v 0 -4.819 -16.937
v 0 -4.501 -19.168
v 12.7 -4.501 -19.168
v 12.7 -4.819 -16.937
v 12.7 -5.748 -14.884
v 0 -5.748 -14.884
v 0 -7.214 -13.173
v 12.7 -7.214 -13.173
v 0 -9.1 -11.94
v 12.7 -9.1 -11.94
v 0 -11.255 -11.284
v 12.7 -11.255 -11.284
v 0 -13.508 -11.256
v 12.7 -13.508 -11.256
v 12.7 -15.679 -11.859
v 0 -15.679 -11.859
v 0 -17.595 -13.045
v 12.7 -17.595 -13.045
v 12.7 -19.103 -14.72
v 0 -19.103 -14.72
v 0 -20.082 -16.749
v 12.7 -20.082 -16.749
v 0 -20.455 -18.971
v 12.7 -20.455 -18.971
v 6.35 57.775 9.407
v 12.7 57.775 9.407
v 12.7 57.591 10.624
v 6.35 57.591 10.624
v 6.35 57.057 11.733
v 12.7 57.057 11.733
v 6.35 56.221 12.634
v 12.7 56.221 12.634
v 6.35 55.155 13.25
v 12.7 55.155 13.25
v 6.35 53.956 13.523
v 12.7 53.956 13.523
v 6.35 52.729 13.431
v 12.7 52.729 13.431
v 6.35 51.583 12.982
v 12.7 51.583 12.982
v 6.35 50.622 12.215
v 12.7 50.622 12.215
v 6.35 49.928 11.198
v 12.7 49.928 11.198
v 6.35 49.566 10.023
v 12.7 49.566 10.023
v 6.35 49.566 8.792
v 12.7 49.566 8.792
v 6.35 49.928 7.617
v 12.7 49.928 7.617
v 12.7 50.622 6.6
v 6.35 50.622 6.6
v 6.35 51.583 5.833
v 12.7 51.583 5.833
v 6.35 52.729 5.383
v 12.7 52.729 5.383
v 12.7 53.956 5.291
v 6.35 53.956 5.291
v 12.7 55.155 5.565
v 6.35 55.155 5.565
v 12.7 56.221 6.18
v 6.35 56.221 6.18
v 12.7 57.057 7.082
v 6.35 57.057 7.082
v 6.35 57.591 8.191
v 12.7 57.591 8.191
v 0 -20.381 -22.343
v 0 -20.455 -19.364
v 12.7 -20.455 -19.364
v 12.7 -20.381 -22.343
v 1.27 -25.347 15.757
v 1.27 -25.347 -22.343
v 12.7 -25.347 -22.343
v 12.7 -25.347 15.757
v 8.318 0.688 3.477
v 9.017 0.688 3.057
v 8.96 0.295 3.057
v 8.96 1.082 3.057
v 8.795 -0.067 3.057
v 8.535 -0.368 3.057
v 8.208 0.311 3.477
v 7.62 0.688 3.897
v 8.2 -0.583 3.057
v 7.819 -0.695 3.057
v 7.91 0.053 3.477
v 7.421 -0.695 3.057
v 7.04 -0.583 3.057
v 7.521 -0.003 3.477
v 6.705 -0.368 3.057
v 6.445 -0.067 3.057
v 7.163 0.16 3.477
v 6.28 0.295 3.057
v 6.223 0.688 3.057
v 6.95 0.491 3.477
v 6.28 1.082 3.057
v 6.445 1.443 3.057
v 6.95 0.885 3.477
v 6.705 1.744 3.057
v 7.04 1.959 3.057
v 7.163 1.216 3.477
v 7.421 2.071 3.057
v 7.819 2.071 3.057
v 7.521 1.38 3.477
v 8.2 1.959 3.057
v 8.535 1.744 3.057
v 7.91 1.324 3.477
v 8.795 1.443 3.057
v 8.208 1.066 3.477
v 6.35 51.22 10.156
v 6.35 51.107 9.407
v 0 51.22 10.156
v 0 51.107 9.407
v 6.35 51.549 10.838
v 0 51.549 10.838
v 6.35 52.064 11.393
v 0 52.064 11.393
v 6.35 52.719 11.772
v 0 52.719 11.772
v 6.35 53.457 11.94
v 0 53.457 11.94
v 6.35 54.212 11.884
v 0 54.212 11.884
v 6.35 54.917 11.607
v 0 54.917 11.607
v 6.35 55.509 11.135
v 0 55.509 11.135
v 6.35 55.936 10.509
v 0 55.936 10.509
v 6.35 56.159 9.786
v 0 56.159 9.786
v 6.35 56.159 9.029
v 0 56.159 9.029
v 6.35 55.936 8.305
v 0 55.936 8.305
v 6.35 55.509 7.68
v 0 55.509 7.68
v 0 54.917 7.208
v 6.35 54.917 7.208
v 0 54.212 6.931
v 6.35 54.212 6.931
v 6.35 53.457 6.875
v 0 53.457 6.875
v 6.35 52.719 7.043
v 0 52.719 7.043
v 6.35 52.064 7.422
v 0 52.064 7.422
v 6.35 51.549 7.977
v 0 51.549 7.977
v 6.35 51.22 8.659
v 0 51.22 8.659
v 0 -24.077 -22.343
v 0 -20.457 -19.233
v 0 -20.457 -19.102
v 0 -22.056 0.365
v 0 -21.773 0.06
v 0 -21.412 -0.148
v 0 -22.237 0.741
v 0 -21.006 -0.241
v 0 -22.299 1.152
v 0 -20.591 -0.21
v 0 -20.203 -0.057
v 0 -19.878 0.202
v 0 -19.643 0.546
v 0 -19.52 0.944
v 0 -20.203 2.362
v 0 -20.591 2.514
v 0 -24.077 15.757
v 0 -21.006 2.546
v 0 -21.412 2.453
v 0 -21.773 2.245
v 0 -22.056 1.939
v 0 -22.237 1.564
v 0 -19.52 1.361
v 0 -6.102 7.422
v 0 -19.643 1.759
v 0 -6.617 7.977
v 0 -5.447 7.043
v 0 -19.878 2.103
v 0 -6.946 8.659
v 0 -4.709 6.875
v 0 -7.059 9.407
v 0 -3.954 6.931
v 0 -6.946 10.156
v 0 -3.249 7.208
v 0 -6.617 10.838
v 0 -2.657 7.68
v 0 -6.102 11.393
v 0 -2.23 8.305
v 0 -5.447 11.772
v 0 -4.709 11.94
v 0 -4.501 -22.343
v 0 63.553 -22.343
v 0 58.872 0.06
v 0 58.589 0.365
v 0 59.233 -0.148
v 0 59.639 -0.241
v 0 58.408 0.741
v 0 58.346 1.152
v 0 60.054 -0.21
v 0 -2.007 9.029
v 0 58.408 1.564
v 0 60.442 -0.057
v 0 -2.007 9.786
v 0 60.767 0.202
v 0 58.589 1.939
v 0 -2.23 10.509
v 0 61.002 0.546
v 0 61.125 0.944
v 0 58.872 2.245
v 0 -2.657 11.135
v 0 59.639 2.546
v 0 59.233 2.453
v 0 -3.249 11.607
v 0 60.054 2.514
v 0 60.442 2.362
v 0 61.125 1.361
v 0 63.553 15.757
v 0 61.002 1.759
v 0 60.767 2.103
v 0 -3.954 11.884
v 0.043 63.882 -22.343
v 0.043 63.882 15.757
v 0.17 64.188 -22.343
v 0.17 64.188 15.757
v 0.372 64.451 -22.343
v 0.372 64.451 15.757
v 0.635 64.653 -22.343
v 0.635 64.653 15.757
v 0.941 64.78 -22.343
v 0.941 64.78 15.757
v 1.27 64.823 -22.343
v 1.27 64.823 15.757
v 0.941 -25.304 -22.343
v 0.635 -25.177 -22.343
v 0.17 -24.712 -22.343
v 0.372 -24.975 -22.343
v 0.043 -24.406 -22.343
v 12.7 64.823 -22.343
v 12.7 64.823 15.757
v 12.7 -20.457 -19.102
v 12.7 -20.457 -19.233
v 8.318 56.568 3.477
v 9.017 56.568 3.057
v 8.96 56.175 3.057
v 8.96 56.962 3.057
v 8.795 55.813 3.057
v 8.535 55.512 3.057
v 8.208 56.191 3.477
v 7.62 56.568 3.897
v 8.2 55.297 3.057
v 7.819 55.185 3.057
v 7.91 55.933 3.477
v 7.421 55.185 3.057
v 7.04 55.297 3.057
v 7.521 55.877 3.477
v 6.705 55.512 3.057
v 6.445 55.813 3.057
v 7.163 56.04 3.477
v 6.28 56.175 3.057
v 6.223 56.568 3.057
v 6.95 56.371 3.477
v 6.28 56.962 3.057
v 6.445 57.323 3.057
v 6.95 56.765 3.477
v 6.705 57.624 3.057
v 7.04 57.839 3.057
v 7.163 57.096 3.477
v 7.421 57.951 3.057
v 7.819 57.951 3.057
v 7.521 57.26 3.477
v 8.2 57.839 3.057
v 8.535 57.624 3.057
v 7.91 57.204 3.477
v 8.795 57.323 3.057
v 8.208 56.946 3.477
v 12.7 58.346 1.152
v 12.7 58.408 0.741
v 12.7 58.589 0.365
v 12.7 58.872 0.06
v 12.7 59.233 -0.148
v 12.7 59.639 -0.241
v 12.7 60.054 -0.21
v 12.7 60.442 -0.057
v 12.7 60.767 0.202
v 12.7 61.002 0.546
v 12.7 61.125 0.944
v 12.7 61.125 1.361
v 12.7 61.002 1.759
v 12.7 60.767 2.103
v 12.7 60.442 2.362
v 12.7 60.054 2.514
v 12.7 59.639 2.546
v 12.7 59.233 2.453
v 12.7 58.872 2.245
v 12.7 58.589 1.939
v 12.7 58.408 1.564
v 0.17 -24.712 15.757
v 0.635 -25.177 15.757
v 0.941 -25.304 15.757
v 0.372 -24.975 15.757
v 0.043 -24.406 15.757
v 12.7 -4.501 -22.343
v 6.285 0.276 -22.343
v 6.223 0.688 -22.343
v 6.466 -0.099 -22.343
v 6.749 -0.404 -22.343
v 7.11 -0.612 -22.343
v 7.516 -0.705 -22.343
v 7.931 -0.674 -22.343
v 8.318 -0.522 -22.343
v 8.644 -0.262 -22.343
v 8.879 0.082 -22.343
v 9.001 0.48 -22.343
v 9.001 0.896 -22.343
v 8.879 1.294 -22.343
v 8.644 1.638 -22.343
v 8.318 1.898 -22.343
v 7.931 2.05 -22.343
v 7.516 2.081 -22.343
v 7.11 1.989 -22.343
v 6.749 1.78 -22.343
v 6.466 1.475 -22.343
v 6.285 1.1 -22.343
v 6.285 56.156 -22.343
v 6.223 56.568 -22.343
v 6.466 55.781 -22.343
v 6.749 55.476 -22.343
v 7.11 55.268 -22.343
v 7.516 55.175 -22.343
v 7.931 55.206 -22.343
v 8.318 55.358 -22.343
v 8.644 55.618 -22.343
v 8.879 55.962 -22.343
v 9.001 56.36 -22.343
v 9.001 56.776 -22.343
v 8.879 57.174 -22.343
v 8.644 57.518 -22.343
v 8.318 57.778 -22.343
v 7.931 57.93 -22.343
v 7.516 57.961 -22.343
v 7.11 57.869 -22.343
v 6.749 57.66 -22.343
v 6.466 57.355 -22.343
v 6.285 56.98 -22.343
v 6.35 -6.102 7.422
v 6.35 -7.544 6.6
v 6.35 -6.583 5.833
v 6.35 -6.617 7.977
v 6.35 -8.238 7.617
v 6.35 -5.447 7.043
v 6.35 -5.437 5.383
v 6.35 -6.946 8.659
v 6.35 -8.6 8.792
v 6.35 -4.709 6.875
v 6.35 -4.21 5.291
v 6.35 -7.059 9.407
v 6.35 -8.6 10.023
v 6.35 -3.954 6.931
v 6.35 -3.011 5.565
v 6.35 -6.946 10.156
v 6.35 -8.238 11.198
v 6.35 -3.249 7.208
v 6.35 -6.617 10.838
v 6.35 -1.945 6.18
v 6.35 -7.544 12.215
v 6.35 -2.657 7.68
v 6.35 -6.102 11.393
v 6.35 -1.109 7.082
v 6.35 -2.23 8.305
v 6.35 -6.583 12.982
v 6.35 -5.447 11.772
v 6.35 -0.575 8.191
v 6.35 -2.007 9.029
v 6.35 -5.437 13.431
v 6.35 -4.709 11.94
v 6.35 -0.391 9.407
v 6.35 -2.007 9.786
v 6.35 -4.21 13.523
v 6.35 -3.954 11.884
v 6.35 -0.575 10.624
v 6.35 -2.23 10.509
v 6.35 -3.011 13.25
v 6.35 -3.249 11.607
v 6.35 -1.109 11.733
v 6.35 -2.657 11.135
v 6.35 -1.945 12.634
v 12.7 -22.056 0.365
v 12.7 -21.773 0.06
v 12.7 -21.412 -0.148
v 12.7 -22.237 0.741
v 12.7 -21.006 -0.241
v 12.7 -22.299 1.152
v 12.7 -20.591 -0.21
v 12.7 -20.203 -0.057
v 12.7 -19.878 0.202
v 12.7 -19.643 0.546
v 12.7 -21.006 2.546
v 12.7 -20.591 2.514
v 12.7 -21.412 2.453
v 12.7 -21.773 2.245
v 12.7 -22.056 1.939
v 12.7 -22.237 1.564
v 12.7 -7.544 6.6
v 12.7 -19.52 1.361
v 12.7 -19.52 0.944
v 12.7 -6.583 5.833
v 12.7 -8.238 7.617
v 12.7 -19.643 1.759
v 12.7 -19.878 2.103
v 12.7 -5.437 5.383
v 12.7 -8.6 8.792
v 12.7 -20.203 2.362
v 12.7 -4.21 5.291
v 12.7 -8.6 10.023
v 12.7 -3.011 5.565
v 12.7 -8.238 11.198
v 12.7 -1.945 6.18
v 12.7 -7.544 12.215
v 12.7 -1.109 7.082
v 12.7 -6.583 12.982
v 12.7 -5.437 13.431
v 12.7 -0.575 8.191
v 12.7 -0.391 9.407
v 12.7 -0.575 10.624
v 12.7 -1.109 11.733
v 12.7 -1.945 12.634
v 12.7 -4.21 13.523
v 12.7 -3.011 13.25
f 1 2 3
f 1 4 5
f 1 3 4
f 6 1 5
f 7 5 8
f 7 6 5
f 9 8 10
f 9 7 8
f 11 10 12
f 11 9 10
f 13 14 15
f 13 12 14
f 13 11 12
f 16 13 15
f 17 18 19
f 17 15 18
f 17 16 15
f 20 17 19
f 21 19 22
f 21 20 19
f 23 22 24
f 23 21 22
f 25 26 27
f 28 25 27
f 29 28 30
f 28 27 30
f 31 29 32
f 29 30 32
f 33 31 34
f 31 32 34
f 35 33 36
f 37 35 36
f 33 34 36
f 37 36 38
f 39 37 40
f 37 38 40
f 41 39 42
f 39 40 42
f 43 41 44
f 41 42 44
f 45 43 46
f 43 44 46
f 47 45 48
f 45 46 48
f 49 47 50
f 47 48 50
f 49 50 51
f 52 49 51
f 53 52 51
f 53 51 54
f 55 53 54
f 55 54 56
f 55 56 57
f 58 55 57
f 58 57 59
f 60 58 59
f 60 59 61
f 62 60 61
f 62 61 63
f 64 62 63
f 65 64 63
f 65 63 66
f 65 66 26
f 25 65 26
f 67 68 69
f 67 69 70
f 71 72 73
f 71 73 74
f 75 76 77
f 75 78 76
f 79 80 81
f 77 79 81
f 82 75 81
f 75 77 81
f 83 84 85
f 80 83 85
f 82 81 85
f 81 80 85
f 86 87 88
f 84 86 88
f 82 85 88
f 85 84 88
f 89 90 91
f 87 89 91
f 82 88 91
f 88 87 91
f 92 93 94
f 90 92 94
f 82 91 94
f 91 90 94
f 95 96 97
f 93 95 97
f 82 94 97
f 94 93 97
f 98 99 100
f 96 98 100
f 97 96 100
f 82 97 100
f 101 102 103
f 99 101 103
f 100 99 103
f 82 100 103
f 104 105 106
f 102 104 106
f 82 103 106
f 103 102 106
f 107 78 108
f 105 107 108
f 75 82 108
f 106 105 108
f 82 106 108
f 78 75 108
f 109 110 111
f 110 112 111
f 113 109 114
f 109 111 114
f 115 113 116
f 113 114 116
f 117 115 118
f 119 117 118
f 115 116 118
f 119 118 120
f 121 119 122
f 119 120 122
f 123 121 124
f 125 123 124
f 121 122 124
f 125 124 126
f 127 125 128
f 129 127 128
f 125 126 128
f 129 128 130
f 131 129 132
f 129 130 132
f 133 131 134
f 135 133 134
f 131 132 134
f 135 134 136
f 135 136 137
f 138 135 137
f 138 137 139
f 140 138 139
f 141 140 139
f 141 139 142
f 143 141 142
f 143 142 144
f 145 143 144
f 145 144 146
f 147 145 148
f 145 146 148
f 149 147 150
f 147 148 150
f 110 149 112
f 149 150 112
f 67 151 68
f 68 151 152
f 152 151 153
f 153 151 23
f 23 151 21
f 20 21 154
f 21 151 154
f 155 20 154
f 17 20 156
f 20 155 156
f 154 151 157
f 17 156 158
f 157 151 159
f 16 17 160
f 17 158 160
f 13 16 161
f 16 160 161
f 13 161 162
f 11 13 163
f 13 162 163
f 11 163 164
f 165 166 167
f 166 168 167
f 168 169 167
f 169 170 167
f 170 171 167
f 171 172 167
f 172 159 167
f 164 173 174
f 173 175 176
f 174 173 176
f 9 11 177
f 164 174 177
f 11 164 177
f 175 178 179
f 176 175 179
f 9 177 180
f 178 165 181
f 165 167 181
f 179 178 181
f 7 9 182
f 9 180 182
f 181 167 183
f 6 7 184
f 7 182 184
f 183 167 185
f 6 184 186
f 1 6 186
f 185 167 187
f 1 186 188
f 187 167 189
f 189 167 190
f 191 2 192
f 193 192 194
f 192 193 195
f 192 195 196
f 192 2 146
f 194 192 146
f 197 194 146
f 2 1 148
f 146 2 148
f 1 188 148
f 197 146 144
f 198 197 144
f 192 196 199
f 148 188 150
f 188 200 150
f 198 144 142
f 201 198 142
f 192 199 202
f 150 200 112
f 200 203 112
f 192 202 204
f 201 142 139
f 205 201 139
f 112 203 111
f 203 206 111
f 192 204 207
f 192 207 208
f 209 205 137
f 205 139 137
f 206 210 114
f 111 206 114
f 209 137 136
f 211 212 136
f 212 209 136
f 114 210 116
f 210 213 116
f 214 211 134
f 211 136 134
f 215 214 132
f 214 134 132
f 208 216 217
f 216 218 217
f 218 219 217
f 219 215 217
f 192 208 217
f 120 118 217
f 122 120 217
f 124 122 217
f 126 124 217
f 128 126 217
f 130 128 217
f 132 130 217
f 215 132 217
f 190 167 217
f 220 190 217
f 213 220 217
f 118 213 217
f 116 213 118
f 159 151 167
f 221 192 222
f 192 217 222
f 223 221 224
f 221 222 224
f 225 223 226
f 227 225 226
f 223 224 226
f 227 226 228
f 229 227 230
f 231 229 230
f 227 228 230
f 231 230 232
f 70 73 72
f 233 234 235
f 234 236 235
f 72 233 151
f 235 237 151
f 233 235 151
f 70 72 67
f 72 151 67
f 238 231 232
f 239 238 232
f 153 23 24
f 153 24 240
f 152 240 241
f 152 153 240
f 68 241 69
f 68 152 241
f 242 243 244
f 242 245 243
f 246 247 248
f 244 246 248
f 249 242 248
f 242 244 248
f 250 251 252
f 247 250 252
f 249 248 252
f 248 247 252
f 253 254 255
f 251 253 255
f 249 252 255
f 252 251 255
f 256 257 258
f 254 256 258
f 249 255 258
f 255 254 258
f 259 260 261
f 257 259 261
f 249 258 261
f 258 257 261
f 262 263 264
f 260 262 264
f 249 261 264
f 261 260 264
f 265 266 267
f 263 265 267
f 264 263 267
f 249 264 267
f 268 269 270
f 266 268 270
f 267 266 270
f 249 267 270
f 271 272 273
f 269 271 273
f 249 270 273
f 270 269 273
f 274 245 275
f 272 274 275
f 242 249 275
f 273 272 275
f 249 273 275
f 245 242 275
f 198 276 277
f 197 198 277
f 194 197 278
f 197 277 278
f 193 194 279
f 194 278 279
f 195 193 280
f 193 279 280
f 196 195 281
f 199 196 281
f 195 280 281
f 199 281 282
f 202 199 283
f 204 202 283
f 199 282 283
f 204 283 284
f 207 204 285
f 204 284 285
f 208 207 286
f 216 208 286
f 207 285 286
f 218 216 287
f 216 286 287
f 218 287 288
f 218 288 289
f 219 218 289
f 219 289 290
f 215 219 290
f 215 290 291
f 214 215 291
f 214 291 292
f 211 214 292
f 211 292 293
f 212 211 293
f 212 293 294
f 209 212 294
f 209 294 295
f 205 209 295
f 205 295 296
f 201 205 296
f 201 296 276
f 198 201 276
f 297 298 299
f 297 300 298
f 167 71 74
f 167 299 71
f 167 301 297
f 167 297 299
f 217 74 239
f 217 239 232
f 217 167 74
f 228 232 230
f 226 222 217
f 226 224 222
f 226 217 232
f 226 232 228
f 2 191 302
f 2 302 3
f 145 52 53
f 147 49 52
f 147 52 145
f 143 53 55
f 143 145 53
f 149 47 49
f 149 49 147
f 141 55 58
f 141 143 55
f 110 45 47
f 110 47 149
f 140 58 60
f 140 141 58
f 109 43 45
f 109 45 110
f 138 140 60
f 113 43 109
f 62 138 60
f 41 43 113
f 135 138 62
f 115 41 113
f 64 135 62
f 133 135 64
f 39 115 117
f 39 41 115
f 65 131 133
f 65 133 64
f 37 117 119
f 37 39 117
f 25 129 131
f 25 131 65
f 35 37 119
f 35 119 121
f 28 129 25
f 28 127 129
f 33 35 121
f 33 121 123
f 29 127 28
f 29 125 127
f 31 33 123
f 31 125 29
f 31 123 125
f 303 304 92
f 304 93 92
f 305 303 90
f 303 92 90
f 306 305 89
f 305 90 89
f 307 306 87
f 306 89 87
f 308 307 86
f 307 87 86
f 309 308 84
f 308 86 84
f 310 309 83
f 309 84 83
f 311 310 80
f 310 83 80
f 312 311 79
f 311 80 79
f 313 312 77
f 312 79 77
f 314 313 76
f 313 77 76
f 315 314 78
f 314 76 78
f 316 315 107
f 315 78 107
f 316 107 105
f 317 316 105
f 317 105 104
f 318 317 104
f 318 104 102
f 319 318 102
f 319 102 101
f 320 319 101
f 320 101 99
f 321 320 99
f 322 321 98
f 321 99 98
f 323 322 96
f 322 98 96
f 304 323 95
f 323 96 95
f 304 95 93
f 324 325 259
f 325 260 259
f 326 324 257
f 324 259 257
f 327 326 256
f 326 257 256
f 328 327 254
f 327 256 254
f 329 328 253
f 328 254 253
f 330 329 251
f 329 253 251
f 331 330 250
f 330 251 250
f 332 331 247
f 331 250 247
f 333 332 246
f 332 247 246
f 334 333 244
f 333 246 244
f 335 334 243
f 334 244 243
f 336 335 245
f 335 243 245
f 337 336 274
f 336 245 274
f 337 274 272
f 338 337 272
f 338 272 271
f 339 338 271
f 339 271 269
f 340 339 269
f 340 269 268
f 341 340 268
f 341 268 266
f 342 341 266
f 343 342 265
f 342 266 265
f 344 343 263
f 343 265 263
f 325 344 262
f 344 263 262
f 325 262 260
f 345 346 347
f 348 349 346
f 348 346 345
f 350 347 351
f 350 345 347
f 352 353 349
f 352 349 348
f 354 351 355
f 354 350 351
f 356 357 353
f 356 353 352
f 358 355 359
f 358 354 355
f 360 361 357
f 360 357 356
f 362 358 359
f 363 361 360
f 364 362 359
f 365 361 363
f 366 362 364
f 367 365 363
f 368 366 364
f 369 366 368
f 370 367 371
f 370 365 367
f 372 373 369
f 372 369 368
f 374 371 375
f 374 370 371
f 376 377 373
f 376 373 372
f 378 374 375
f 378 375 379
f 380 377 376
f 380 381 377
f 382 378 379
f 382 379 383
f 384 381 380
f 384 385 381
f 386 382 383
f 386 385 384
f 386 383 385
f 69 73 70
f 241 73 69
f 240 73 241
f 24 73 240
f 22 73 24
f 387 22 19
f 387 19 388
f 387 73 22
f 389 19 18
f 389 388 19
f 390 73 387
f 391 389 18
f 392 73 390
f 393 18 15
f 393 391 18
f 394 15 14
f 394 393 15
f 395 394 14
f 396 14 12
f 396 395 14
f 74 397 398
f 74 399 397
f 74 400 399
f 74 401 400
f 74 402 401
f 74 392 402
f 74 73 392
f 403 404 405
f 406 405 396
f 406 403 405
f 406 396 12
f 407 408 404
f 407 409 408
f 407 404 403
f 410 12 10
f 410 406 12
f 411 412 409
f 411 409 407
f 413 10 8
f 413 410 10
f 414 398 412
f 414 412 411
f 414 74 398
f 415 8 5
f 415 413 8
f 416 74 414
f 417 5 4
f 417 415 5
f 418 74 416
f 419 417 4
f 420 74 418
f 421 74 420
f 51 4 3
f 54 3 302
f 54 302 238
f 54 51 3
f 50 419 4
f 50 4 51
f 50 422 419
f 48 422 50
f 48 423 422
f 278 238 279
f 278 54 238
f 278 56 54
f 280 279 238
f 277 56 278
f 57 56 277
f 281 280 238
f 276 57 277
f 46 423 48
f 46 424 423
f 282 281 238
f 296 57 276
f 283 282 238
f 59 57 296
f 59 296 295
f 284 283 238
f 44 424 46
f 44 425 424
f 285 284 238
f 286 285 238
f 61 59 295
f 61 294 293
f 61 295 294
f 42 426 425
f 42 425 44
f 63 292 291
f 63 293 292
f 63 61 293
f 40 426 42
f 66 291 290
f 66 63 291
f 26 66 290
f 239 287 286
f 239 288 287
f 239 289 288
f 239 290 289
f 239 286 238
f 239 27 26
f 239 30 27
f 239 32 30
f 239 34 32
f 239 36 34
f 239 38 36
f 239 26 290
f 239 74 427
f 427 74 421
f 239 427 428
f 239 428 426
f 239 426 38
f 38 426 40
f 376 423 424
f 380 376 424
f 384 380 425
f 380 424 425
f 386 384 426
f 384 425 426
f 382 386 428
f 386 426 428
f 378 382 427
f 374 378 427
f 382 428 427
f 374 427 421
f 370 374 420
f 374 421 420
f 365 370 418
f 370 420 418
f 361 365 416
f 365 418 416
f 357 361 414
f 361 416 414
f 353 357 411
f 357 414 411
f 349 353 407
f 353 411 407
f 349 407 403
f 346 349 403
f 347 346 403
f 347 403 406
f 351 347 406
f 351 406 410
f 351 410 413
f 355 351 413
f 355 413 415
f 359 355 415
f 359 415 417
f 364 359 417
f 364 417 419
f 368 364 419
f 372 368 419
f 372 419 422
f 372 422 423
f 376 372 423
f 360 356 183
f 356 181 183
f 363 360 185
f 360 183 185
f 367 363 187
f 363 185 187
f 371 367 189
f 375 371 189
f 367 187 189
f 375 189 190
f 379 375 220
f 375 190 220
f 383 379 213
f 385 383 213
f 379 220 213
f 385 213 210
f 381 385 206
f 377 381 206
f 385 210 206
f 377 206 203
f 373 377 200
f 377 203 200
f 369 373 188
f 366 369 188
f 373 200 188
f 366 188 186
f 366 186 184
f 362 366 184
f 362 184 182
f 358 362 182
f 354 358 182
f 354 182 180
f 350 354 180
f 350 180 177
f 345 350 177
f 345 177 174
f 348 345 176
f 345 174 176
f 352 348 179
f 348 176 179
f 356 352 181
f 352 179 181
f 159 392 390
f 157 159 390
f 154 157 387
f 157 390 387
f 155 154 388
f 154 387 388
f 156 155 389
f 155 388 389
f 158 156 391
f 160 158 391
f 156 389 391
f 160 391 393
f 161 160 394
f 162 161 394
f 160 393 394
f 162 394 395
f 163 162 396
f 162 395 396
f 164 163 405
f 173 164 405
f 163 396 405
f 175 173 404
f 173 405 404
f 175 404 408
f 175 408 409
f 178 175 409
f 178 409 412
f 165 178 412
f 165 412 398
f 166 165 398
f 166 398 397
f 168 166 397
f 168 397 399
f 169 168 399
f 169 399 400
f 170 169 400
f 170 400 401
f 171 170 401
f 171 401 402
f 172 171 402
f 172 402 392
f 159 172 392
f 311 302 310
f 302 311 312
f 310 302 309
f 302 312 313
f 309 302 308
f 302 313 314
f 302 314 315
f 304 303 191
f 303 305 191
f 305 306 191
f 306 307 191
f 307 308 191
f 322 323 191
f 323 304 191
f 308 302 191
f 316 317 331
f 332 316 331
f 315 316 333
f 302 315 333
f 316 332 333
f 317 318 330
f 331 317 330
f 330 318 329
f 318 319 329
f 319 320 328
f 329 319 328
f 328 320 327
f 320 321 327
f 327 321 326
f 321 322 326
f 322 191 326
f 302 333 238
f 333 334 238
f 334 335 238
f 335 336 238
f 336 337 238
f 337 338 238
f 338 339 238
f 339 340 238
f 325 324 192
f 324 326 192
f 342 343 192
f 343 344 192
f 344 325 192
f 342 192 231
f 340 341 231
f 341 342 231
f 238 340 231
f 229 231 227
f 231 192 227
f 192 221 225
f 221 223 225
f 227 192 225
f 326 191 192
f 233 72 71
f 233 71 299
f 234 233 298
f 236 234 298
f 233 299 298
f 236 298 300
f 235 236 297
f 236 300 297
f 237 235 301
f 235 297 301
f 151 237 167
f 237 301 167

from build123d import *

# Parameters (mm, degrees)
F0_W           = 90.17
F0_H           = 38.1
F1_DEPTH       = 12.7
F2_D           = 2.794
F4_D           = 5.08
F4_CBORE_D     = 8.255
F4_CBORE_DEPTH = 6.35
F6_DEPTH       = 12.701
F8_D           = 2.794
F8_DEPTH       = 25.4
F8_TIP         = 0.8394022848
F9_R           = 1.27


with BuildPart() as f1:
    # F0 (on Right) → F1 (new body)
    with BuildSketch(Plane.YZ):
        with Locations((19.7381743398, -3.2925931737)):
            Rectangle(F0_W, F0_H)
    extrude(amount=F1_DEPTH)

    # F2 (through all)
    with Locations(Plane(origin=(0, 0, 0), x_dir=(0, 1, 0), z_dir=(-1, 0, 0))):
        with Locations((-20.9018256602, -1.1524068263), (59.7431743398, -1.1524068263)):
            Hole(F2_D / 2)

    # F4 (through all)
    with Locations(Plane.YZ.offset(12.7)):
        with Locations((-4.5188256602, 9.4074068263), (53.6471743398, 9.4074068263)):
            CounterBoreHole(F4_D / 2, F4_CBORE_D / 2, F4_CBORE_DEPTH)

    # F5 (on Right) → F6 (cut, through all)
    with BuildSketch(Plane.YZ):
        with BuildLine():
            ThreePointArc((-4.5006518298, -19.1675931737), (-12.3808319272, -11.1898662261), (-20.4548983074, -18.9713068193))
            ThreePointArc((-20.4548983074, -18.9713068193), (-20.4573256602, -19.1675931737), (-20.4548983074, -19.3638795281))
            Line((-20.4548983074, -19.3638795281), (-20.3756518298, -22.5674978264))
            Line((-20.3756518298, -22.5674978264), (-4.5006518298, -22.5674978264))
            Line((-4.5006518298, -22.5674978264), (-4.5006518298, -19.1675931737))
        make_face()
    extrude(amount=F6_DEPTH, mode=Mode.SUBTRACT)

    # F8
    with Locations(Plane(origin=(0, 0, -22.3425931737), x_dir=(1, 0, 0), z_dir=(0, 0, -1))):
        with Locations((7.62, -0.6881743398), (7.62, -56.5681743398)):
            Hole(F8_D / 2, depth=F8_DEPTH)
            with Locations((0, 0, -(F8_DEPTH + F8_TIP / 2))):  # 118° drill point
                Cone(0, F8_D / 2, F8_TIP, mode=Mode.SUBTRACT)

    # F9
    f9_edges = [f1.edges().sort_by_distance(p)[0] for p in [
        (0, -25.346826, -3.292593),
        (0, 64.823174, -3.292593),
    ]]
    fillet(f9_edges, radius=F9_R)


solid = f1.part
